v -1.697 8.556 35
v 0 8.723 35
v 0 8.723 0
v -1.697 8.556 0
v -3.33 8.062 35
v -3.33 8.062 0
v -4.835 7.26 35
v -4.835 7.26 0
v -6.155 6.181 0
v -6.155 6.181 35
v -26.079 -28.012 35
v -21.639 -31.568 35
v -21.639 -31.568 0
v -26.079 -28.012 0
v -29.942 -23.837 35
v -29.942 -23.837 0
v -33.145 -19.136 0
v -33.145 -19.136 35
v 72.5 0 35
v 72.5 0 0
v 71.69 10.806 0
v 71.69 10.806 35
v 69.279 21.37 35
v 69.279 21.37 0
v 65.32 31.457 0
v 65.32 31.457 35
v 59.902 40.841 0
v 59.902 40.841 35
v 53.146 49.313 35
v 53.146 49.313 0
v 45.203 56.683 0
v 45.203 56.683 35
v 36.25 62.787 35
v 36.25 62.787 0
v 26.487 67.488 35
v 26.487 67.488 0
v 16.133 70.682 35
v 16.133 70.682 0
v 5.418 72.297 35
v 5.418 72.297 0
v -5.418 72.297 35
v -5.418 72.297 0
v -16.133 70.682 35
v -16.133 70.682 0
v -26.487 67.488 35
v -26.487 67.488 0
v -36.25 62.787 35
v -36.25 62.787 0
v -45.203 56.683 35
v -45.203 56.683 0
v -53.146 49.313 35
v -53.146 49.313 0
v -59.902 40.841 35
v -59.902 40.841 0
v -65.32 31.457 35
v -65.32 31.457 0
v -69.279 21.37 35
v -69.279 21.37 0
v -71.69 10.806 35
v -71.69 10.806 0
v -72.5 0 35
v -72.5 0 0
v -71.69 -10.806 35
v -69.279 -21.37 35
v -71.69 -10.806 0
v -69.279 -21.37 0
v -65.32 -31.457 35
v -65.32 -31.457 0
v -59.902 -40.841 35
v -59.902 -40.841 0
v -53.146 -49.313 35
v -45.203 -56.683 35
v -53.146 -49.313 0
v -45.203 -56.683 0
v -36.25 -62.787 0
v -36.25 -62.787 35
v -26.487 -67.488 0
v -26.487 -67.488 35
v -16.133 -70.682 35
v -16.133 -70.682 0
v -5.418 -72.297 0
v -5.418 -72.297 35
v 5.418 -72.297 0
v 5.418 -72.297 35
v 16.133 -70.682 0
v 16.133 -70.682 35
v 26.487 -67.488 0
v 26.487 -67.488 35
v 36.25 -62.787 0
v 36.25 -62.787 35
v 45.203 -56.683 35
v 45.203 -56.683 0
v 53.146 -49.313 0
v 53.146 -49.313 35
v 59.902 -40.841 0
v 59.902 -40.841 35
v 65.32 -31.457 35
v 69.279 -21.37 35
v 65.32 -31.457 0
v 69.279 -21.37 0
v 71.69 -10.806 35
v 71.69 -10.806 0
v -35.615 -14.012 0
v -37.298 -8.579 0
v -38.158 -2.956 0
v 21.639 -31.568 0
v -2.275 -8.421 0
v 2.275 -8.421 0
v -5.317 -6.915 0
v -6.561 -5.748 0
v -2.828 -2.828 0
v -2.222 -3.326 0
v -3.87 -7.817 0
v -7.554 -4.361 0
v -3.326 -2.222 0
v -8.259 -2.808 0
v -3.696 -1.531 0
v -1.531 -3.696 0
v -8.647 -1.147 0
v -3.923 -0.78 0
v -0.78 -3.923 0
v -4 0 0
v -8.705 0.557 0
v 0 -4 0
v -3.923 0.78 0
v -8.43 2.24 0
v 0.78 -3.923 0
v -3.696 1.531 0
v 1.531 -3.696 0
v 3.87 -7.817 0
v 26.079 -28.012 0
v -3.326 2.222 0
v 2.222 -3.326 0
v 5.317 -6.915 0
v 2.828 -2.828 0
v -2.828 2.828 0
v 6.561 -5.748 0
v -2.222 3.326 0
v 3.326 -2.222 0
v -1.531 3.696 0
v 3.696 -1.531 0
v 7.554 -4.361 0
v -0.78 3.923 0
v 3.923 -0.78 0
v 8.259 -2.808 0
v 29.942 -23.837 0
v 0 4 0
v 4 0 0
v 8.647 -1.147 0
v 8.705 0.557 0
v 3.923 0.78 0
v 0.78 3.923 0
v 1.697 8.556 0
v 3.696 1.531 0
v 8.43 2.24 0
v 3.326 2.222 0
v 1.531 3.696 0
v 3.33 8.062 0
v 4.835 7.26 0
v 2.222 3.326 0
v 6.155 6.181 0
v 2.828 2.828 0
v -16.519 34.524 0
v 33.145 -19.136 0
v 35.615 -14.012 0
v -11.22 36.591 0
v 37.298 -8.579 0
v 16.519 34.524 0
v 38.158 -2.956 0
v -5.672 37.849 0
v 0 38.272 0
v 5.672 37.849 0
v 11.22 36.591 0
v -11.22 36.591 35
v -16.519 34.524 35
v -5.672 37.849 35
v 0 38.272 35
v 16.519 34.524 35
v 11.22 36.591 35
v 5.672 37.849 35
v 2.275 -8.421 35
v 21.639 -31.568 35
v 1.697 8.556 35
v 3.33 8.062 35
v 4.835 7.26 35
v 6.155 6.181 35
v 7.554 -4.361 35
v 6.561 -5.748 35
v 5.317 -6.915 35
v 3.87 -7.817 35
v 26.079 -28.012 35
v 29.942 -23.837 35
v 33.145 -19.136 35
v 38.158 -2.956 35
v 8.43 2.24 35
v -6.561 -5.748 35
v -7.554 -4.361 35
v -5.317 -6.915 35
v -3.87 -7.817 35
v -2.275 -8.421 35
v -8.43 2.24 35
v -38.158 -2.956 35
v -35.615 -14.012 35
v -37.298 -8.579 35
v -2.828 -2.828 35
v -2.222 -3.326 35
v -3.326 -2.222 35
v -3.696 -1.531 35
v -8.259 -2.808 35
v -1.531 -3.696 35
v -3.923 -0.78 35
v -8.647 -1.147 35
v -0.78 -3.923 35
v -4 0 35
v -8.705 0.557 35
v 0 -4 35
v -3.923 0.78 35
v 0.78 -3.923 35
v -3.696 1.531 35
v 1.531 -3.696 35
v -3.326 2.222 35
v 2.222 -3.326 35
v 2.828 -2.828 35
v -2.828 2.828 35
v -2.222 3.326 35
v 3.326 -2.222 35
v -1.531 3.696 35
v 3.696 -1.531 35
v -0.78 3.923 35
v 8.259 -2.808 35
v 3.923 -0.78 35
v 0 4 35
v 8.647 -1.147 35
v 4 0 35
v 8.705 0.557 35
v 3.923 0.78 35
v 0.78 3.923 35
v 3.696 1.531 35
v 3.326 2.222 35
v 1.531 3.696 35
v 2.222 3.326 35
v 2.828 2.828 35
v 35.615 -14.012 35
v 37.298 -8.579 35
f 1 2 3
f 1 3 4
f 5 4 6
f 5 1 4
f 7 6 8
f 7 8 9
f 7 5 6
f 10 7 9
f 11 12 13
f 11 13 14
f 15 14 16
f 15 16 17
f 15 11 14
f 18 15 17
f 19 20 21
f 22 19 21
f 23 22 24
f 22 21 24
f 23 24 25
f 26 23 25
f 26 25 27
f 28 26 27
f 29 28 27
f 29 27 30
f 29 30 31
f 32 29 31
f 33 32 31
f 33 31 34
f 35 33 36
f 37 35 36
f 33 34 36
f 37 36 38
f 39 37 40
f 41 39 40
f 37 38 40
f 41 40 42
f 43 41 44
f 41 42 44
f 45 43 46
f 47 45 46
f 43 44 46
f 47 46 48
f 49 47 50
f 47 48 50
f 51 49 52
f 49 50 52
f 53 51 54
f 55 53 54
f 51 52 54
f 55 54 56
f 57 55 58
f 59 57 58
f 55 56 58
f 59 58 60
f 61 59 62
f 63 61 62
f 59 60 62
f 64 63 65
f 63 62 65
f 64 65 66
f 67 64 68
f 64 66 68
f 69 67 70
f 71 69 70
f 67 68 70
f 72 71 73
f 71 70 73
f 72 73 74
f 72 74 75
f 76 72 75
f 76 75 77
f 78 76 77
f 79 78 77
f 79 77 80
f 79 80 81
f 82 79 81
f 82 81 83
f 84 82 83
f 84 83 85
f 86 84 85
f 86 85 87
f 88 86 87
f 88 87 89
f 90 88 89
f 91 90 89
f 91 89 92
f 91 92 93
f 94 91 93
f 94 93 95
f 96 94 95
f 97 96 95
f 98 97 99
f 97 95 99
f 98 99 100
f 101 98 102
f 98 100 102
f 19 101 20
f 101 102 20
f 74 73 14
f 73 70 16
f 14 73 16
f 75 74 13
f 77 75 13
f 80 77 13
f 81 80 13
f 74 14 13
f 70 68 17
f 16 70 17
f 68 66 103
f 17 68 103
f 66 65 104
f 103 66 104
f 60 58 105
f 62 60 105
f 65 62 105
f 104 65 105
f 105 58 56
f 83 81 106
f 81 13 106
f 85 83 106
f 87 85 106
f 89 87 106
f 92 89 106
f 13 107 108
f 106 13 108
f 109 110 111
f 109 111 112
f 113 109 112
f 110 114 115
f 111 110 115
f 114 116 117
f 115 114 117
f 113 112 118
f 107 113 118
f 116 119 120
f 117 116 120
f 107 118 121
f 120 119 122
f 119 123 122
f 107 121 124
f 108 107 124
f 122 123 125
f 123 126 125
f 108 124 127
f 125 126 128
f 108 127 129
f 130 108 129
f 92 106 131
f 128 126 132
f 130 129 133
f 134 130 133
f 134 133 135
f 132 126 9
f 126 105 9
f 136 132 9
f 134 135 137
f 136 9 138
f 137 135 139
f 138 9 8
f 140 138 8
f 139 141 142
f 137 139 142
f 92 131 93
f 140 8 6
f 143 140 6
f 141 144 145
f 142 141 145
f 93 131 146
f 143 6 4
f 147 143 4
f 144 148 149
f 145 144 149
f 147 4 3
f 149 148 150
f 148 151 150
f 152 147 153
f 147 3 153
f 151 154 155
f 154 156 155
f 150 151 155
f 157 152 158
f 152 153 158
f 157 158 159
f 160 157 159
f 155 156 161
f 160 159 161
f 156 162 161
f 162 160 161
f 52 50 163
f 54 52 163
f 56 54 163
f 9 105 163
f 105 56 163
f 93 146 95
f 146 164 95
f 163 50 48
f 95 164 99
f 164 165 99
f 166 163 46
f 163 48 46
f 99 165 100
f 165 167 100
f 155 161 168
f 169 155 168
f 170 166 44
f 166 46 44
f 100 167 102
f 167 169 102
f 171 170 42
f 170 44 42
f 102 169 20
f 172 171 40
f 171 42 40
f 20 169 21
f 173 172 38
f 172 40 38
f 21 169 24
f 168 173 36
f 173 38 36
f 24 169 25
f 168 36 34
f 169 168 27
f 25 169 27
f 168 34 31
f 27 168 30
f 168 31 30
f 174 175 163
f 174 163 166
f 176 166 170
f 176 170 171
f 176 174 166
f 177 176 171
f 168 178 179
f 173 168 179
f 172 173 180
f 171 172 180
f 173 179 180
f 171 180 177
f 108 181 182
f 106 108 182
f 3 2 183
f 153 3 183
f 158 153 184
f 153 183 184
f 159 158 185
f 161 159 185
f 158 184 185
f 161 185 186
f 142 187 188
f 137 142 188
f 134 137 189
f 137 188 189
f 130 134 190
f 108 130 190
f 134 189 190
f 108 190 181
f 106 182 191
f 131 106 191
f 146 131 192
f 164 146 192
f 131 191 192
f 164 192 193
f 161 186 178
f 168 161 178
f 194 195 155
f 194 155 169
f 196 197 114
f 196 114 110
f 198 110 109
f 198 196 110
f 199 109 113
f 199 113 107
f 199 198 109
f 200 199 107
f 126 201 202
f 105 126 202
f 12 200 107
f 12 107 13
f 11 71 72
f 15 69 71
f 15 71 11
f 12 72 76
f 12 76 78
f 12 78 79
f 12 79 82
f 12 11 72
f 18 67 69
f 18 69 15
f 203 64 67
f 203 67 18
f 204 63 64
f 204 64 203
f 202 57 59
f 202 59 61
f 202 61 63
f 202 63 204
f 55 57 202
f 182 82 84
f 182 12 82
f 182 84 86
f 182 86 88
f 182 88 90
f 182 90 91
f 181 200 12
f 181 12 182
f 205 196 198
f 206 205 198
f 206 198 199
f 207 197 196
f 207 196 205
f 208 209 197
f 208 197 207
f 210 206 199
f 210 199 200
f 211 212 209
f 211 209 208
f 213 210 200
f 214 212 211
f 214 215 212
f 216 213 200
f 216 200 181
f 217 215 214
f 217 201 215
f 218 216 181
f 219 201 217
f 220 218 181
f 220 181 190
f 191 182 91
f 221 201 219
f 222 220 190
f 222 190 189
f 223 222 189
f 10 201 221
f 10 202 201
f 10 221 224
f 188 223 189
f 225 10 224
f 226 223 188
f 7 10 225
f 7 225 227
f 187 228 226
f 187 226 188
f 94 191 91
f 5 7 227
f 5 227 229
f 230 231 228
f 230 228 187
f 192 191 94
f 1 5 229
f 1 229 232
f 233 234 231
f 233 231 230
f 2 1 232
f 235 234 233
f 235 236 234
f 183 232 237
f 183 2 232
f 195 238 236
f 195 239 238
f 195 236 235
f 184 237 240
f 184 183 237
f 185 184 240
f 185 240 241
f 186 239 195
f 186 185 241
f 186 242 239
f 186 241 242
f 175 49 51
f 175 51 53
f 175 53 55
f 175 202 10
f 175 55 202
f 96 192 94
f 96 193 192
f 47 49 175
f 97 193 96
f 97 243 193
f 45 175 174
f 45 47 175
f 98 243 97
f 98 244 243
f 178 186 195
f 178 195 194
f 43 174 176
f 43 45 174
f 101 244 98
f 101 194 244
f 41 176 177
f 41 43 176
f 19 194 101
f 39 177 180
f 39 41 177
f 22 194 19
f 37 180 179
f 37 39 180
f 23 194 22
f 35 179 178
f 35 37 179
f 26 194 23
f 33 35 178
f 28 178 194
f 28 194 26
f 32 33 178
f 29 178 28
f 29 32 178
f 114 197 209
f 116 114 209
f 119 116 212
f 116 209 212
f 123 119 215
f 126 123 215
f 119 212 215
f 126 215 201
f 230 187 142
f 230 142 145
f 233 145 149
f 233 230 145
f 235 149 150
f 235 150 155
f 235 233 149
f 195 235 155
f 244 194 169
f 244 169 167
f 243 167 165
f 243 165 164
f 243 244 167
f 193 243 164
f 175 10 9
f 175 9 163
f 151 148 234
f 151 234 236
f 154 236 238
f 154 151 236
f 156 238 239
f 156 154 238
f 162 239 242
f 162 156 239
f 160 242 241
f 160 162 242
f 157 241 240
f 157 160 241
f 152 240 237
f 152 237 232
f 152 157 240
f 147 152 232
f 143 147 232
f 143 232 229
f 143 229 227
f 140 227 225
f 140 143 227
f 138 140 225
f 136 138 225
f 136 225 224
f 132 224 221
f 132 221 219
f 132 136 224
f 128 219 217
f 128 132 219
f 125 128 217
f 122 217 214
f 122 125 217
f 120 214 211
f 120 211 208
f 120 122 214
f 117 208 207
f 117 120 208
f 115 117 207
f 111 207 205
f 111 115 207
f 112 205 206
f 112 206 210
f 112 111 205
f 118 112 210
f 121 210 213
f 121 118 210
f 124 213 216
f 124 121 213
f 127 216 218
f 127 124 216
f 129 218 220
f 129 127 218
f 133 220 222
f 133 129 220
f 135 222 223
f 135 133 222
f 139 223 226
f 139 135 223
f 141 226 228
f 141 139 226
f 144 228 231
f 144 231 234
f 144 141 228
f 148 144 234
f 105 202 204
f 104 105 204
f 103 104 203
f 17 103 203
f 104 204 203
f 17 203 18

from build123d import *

# Parameters (mm, degrees)
SKETCH1_R            = 72.5
SKETCH1_R_2          = 4
BOSS_EXTRUDE1_DEPTH  = 35
CUT_EXTRUDE1_DEPTH   = 35
CIRPATTERN6_COUNT    = 3
MIRROR2_COPY_1_DEPTH = 35
MIRROR2_COPY_2_DEPTH = 35


with BuildPart() as part:
    # Sketch1 → Boss-Extrude1 (new body)
    with BuildSketch(Plane.XY):
        Circle(SKETCH1_R)
        Circle(SKETCH1_R_2, mode=Mode.SUBTRACT)
    extrude(amount=BOSS_EXTRUDE1_DEPTH)

    # Sketch3 → Cut-Extrude1 (cut)
    with BuildSketch(Plane.XY.offset(35)):
        with BuildLine():
            Line((0, 38.272172541), (0, 8.722907964))
            ThreePointArc((0, 8.722907964), (-3.329803479, 8.062352767), (-6.155298303, 6.180730228))
            Line((-6.155298303, 6.180730228), (-16.518963046, 34.523659292))
            ThreePointArc((-16.518963046, 34.523659292), (-8.469467098, 37.323281181), (0, 38.272172541))
        make_face()
    cut_extrude1 = extrude(amount=-CUT_EXTRUDE1_DEPTH, mode=Mode.SUBTRACT)

    # Mirror1: Cut-Extrude1 across plane
    add(cut_extrude1.mirror(Plane(origin=(0, 38.272172541, 0), x_dir=(0, 0, 1), z_dir=(1, 0, 0))), mode=Mode.SUBTRACT)

    # CirPattern6: Cut-Extrude1 ×3 about axis
    cirpattern6_axis = Axis((0, 0, 0), (0, 0, 1))
    for i in range(1, CIRPATTERN6_COUNT):
        add(cut_extrude1.rotate(cirpattern6_axis, i * 360 / CIRPATTERN6_COUNT), mode=Mode.SUBTRACT)

    # Mirror2: Cut-Extrude1 across plane
    add(cut_extrude1.mirror(Plane(origin=(33.144673679, -19.136086271, 0), x_dir=(0, 0, 1), z_dir=(-0.5000000000000041, -0.8660254037844364, 0))), mode=Mode.SUBTRACT)

    # Mirror2 copy 1 sketch → Mirror2 copy 1 (cut)
    with BuildSketch(Plane(origin=(0, 0, 35), x_dir=(-1, 0, 0), z_dir=(0, 0, 1))):
        with BuildLine():
            Line((0, -38.272172541), (0, -8.722907964))
            ThreePointArc((0, -8.722907964), (-3.329803479, -8.062352767), (-6.155298303, -6.180730228))
            Line((-6.155298303, -6.180730228), (-16.518963046, -34.523659292))
            ThreePointArc((-16.518963046, -34.523659292), (-8.469467098, -37.323281181), (0, -38.272172541))
        make_face()
    extrude(amount=-MIRROR2_COPY_1_DEPTH, mode=Mode.SUBTRACT)

    # Mirror2 copy 2 sketch → Mirror2 copy 2 (cut)
    with BuildSketch(Plane(origin=(0, 0, 35), x_dir=(0.5000000000000079, 0.8660254037844346, 0), z_dir=(0, 0, 1))):
        with BuildLine():
            Line((0, -38.272172541), (0, -8.722907964))
            ThreePointArc((0, -8.722907964), (-3.329803479, -8.062352767), (-6.155298303, -6.180730228))
            Line((-6.155298303, -6.180730228), (-16.518963046, -34.523659292))
            ThreePointArc((-16.518963046, -34.523659292), (-8.469467098, -37.323281181), (0, -38.272172541))
        make_face()
    extrude(amount=-MIRROR2_COPY_2_DEPTH, mode=Mode.SUBTRACT)


solid = part.part
